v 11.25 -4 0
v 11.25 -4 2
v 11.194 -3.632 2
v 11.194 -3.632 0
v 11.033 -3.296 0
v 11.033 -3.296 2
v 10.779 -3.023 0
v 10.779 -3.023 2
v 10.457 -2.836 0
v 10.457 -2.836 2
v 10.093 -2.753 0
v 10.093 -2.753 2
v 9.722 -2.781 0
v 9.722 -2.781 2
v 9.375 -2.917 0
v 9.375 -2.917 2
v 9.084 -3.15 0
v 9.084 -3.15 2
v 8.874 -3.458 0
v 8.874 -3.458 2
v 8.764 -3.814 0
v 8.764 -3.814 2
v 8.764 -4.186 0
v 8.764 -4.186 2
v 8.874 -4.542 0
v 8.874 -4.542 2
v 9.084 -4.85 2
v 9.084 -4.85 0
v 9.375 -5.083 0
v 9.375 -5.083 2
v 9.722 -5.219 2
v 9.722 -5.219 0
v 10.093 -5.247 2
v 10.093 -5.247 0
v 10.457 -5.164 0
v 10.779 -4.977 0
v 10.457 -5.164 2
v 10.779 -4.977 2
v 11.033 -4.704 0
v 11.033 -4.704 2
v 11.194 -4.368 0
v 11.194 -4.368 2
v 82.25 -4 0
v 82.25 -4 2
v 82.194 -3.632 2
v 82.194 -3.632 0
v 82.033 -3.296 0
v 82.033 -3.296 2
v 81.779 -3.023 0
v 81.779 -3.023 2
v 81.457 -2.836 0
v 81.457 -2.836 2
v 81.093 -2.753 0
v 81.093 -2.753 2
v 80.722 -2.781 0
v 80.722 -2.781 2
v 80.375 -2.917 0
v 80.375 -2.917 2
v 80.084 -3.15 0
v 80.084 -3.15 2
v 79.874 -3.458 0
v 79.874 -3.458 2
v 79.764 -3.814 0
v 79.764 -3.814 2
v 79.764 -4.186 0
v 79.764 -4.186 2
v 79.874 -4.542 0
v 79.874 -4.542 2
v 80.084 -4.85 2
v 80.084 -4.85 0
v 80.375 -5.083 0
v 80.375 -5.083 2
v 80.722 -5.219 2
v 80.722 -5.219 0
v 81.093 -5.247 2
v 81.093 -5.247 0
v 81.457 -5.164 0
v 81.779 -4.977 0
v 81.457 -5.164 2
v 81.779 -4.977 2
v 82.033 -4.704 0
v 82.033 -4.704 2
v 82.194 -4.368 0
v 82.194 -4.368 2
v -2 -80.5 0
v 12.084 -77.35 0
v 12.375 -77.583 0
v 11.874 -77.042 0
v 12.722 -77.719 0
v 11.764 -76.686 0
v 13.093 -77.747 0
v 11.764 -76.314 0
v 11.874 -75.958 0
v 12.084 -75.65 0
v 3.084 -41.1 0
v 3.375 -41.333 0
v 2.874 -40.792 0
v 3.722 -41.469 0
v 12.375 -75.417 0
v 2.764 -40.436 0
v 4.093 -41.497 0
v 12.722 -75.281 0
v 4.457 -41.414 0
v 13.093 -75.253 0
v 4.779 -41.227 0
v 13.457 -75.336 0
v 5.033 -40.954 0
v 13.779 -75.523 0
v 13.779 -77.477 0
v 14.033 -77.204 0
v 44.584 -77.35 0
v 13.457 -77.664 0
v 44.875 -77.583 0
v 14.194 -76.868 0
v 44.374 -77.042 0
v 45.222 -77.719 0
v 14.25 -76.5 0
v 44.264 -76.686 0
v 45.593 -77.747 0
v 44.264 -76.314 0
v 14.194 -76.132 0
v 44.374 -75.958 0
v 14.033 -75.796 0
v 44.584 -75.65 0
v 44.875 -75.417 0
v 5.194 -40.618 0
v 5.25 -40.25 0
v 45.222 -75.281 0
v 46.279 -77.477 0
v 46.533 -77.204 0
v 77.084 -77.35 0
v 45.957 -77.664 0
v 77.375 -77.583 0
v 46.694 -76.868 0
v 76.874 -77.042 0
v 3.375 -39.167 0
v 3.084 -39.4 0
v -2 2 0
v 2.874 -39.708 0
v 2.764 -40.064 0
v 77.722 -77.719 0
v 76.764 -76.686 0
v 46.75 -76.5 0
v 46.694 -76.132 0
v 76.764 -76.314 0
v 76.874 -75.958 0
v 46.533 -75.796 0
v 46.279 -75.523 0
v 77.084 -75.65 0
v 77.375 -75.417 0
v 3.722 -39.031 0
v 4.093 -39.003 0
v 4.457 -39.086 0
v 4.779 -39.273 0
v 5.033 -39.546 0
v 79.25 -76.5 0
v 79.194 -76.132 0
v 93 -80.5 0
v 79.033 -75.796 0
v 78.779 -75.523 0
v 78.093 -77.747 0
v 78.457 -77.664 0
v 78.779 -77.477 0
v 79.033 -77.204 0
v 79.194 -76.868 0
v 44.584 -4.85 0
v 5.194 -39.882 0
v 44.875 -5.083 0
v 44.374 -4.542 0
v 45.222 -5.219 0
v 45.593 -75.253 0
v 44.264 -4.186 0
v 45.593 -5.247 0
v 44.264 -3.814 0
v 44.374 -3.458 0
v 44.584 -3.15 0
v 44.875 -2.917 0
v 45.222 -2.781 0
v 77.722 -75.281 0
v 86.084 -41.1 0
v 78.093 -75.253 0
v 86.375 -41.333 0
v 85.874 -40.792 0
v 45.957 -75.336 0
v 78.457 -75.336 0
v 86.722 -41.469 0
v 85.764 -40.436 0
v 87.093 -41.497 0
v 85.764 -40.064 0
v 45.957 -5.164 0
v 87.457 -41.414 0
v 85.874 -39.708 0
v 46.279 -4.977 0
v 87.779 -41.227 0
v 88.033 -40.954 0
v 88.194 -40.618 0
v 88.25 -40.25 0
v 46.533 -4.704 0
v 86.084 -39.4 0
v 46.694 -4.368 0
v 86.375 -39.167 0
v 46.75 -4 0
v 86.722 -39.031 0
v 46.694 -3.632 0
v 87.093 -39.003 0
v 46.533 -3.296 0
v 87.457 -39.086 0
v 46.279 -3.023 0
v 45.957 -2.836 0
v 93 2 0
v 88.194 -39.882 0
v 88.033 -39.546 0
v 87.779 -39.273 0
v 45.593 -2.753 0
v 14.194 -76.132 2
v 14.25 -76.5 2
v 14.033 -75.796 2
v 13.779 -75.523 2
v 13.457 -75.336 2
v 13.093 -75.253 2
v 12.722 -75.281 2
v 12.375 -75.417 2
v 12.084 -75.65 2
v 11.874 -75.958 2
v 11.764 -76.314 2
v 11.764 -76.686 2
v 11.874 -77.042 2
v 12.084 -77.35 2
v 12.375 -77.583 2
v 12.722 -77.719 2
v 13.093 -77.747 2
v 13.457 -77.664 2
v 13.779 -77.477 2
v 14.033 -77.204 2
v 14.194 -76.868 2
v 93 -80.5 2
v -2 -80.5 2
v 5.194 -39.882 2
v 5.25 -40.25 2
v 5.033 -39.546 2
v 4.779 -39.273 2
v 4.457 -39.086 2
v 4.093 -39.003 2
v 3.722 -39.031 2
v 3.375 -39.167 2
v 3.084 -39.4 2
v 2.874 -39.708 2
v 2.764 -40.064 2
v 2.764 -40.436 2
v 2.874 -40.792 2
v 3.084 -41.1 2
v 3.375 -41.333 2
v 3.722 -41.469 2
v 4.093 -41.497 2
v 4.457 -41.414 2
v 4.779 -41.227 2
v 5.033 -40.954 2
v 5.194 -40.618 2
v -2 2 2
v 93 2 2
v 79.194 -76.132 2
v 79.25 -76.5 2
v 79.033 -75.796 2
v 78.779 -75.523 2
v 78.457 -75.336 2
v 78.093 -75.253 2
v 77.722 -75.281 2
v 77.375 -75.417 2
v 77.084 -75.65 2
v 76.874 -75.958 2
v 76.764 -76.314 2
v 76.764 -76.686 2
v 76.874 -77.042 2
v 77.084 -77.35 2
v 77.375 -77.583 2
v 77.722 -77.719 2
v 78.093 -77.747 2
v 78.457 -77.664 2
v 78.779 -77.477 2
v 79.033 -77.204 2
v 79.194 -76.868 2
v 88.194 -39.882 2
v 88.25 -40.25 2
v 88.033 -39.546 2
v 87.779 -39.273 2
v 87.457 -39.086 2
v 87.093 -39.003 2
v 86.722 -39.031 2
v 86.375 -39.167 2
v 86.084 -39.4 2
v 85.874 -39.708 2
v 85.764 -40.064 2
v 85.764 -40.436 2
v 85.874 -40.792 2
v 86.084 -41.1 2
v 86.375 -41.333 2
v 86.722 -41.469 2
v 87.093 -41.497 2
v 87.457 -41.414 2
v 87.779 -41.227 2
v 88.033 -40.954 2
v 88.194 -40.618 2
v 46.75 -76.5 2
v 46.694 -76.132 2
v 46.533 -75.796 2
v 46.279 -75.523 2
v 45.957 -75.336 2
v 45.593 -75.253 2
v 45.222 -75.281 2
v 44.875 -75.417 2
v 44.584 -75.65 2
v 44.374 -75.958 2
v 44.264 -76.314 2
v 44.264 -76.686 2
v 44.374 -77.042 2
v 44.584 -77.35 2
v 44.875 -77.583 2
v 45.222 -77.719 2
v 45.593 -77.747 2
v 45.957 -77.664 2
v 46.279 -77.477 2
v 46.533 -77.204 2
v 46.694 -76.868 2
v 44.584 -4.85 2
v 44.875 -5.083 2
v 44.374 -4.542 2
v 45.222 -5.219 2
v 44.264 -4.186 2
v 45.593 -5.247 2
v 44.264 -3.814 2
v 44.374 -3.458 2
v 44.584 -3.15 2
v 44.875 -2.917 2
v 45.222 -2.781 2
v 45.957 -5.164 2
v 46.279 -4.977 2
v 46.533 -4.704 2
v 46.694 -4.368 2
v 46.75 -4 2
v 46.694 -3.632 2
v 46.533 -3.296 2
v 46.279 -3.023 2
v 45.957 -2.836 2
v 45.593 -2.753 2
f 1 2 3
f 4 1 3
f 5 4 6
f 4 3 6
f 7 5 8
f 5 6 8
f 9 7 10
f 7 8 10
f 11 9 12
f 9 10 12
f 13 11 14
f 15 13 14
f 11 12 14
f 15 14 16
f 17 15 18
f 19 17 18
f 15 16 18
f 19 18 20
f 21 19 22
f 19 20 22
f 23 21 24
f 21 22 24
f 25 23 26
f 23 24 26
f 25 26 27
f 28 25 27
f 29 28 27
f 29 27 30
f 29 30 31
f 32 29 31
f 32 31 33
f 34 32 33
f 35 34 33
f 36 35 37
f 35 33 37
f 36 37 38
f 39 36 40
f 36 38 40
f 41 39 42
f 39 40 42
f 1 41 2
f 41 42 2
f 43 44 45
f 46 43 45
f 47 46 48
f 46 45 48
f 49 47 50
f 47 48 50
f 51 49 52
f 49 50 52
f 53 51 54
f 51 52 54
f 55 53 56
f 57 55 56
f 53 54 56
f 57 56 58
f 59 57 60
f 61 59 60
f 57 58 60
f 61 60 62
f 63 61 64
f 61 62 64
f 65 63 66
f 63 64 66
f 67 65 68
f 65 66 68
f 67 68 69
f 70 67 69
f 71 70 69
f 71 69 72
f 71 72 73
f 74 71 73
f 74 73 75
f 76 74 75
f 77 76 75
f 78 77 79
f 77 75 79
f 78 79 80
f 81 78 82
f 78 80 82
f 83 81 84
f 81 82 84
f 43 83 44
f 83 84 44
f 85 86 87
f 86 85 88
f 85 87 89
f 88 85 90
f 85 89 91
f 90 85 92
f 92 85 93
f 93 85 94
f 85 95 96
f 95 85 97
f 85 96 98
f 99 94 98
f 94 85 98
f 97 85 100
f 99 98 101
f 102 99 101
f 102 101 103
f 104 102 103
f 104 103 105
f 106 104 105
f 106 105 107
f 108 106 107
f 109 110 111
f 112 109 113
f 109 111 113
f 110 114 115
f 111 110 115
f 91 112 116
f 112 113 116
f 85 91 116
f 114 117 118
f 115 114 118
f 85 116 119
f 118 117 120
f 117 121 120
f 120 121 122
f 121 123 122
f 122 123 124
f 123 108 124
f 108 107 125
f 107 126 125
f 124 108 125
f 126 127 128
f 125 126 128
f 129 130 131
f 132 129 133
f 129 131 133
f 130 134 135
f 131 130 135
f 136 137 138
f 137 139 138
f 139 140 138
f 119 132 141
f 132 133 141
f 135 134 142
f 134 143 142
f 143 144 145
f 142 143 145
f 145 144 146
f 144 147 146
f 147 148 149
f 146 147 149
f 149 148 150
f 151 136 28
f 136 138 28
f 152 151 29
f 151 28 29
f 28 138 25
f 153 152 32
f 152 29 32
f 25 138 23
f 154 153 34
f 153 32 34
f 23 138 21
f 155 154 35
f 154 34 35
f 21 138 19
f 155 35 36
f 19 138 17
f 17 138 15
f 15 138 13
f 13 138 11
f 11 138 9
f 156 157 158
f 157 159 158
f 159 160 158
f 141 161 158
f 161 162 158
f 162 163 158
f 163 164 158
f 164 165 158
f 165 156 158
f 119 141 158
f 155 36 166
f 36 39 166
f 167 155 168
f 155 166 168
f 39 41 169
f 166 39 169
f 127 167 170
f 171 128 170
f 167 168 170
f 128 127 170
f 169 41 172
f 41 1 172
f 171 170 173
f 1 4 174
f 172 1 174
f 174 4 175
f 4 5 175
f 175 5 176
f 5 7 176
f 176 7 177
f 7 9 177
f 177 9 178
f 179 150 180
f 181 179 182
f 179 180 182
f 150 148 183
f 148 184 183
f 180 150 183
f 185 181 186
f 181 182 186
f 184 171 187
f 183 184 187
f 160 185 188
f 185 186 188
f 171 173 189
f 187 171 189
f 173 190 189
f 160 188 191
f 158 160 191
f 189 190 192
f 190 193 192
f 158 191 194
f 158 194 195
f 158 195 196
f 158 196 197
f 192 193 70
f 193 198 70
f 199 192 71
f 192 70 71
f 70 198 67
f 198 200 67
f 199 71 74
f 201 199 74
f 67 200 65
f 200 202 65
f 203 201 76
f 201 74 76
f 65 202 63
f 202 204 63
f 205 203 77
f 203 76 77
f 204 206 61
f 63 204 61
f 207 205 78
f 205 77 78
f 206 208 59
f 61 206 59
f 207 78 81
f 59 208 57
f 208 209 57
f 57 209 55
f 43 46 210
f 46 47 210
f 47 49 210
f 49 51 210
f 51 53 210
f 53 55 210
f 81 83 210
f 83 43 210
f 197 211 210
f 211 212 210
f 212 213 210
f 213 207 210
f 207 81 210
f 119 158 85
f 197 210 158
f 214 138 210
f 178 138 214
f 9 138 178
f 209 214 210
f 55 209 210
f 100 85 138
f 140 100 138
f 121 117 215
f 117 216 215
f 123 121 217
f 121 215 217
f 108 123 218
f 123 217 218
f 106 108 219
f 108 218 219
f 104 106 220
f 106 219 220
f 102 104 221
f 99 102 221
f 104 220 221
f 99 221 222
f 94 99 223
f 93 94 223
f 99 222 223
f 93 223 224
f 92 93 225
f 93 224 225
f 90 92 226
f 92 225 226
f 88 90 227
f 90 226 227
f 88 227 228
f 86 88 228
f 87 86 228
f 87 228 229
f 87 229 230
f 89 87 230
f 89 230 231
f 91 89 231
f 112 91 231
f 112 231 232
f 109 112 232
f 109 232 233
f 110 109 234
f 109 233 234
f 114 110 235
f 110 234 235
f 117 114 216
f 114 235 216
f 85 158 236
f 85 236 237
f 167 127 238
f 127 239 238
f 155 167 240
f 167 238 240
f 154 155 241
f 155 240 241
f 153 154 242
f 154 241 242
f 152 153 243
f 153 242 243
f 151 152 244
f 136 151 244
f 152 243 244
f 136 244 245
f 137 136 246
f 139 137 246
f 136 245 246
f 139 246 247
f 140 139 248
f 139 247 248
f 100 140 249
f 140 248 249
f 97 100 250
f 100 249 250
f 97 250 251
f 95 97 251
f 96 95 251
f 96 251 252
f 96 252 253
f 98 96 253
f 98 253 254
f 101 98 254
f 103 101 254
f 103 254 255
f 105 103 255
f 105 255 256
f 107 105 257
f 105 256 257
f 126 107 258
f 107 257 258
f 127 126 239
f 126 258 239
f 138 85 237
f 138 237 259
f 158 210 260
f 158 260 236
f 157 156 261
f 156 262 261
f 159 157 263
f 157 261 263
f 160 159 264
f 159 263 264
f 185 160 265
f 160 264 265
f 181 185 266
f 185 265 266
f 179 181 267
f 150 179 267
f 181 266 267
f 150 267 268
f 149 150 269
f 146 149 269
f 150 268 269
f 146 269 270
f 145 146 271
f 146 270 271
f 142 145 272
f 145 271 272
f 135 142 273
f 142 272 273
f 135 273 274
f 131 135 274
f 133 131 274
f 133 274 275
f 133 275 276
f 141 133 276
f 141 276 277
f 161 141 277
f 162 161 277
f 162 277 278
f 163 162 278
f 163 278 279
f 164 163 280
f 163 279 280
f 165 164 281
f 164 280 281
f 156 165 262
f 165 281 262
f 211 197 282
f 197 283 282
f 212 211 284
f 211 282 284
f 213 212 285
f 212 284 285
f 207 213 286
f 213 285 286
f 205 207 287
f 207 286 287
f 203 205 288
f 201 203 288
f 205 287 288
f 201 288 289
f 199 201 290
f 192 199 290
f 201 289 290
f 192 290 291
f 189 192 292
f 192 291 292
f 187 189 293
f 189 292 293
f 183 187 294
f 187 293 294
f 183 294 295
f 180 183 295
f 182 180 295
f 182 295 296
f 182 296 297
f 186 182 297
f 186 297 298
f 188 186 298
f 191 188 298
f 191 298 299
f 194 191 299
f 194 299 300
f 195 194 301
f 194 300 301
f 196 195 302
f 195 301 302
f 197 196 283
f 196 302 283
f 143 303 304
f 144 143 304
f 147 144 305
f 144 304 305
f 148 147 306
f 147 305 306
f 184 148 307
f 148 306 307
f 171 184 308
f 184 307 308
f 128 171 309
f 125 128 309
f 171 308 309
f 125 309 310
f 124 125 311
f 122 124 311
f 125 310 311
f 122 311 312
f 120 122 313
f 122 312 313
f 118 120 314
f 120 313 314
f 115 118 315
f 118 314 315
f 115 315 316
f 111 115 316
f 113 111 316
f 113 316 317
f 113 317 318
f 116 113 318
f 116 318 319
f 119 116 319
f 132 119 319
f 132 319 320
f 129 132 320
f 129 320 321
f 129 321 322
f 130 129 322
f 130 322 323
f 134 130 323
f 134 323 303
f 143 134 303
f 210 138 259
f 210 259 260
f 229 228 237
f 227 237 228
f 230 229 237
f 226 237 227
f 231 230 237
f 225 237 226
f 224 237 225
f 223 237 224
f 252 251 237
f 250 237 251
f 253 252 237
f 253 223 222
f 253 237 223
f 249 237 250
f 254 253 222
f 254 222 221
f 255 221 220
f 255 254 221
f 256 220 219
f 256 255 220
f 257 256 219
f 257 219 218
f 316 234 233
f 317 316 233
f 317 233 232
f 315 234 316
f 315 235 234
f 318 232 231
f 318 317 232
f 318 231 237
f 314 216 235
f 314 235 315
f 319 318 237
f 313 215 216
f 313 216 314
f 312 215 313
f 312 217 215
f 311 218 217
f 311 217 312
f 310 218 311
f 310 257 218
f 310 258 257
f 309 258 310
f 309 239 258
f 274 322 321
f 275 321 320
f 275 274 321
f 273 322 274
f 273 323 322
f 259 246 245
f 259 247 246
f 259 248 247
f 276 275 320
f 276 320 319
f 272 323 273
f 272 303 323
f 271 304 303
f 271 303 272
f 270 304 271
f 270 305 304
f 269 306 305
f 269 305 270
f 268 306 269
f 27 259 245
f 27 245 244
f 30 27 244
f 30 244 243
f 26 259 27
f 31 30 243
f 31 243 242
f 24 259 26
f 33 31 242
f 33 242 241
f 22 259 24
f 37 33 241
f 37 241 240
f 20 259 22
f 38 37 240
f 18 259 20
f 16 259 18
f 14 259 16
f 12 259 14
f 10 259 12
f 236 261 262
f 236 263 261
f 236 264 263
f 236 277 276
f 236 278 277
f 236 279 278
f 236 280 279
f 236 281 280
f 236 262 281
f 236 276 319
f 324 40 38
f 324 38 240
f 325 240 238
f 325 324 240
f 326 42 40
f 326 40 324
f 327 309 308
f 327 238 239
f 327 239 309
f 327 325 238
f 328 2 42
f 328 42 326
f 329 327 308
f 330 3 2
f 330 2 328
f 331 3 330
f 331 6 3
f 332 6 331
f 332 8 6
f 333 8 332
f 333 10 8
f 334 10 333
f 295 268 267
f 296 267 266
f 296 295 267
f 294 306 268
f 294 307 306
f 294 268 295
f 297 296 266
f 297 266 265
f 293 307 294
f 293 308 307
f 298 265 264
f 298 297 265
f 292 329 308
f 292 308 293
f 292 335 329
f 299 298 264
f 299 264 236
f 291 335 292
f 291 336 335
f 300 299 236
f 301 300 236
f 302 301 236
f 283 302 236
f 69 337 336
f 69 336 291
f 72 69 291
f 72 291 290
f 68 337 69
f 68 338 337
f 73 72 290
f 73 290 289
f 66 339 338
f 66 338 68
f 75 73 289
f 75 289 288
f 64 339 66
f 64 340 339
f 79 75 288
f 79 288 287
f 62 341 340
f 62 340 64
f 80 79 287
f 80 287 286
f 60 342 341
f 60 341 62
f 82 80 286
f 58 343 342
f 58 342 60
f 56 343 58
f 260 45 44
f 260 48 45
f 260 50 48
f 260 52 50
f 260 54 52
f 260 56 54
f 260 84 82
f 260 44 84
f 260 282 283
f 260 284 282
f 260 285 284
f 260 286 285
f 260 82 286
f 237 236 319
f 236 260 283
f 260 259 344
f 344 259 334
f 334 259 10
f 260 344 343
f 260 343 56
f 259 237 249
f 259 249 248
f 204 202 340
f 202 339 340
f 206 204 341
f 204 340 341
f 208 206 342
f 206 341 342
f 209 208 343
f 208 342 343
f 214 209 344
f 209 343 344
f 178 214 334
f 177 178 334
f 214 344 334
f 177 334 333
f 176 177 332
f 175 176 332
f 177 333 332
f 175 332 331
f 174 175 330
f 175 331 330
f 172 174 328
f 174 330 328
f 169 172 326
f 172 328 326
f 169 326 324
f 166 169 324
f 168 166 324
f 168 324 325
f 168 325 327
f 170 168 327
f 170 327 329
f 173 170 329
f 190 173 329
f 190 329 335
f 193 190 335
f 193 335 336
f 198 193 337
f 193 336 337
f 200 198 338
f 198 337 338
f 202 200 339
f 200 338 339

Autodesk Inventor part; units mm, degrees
ref_plane "YZ Plane" through (0, 0, 0) normal (1, 0, 0) x (0, 1, 0)
ref_plane "XZ Plane" through (0, 0, 0) normal (0, 1, 0) x (-1, 0, 0)
ref_plane "XY Plane" through (0, 0, 0) normal (0, 0, 1) x (1, 0, 0)
ref_plane "Work Plane1" through (0, 0, 0) normal (0, 0, 1) x (1, 0, 0)
sketch "Sketch1" plane through (0, 0, 0) normal (0, 0, 1) x (1, 0, 0)
  line L0 (93, -80.5) -> (83, -80.5) projected
  line L1 (93, 2) -> (93, -80.5) projected
  line L2 (-2, -80.5) -> (-2, 2) projected
  line L3 (0, 2) -> (-2, 2) projected
  circle A0 centre (45.5, -4) radius 0.75 projected
  circle A1 centre (81, -4) radius 0.75 projected
  circle A2 centre (10, -4) radius 0.75 projected
  circle A3 centre (4, -40.25) radius 0.75 projected
  circle A4 centre (4, -70.5) radius 0.75 projected
  circle A5 centre (87, -40.25) radius 0.75 projected
  circle A6 centre (81, -76.5) radius 1.25 projected
  circle A7 centre (45.5, -76.5) radius 1.25 projected
  circle A8 centre (10, -76.5) radius 1.25 projected
  line L4 (93, -80.5) -> (-2, -80.5)
  line L5 (-2, -80.5) -> (-2, 2)
  line L6 (-2, 2) -> (93, 2)
  line L7 (93, 2) -> (93, -80.5)
  point P0 (0, 0)
  point P1 (87.75, -75.5)
extrude "Extrusion1" add sketch "Sketch1" along normal blind 2
sketch "Sketch2" plane through (0, 0, 2) normal (0, 0, 1) x (1, 0, 0)
  circle A0 centre (4, -70.5) radius 0.75 projected
  circle A1 centre (4, -70.5) radius 1.25
  circle A2 centre (4, -40.25) radius 0.75 projected
  circle A3 centre (4, -40.25) radius 1.25
  circle A4 centre (10, -4) radius 0.75 projected
  circle A5 centre (10, -4) radius 1.25
  circle A6 centre (45.5, -4) radius 0.75 projected
  circle A7 centre (45.5, -4) radius 1.25
  circle A8 centre (81, -4) radius 0.75 projected
  circle A9 centre (81, -4) radius 1.25
  circle A10 centre (87, -40.25) radius 0.75 projected
  circle A11 centre (87, -40.25) radius 1.25
  point P0 (0, 0)
  dimension "d2" = 2.5
  dimension "d3" = 2.5
  dimension "d4" = 2.5
  dimension "d5" = 2.5
  dimension "d6" = 2.5
  dimension "d7" = 2.5
extrude "Extrusion2" cut sketch "Sketch2" against normal blind 2
sketch "Sketch3" plane through (0, 0, 2) normal (0, 0, 1) x (1, 0, 0)
  circle A0 centre (4, -70.5) radius 1.25 projected
  circle A1 centre (4, -70.5) radius 1.25
  point P0 (0, 0)
extrude "Extrusion3" add sketch "Sketch3" against normal blind 2
sketch "Sketch4" plane through (0, 0, 2) normal (0, 0, 1) x (1, 0, 0)
  line L0 (8.2244, -73.6994) -> (84.6233, -73.6994)
  line L1 (84.6233, -73.6994) -> (84.6233, -78.8307)
  line L2 (84.6233, -78.8307) -> (8.2244, -78.8307)
  line L3 (8.2244, -78.8307) -> (8.2244, -73.6994)
  point P0 (0, 0)
extrude "Extrusion4" add sketch "Sketch4" against normal blind 2
sketch "Sketch5" plane through (0, 0, 2) normal (0, 0, 1) x (1, 0, 0)
  line L0 (3.25, -80.5) -> (3.25, -75.5)
  line L1 (83, -80.5) -> (83, -65.5) projected
  circle A0 centre (45.5, -76.5) radius 1.25 projected
  line L2 (83, -72.5) -> (83, -80.5)
  circle A1 centre (78, -76.5) radius 1.25
  line L3 (8, -80.5) -> (8, -65.5) projected
  line L4 (8, -72.5) -> (8, -80.5)
  circle A2 centre (13, -76.5) radius 1.25
  point P0 (0, 0)
  dimension "d21" = 2.5
  dimension "d25" = 2.5
extrude "Extrusion5" cut sketch "Sketch5" against normal blind 2
properties part number "UP" material "Nylon 6/6"
